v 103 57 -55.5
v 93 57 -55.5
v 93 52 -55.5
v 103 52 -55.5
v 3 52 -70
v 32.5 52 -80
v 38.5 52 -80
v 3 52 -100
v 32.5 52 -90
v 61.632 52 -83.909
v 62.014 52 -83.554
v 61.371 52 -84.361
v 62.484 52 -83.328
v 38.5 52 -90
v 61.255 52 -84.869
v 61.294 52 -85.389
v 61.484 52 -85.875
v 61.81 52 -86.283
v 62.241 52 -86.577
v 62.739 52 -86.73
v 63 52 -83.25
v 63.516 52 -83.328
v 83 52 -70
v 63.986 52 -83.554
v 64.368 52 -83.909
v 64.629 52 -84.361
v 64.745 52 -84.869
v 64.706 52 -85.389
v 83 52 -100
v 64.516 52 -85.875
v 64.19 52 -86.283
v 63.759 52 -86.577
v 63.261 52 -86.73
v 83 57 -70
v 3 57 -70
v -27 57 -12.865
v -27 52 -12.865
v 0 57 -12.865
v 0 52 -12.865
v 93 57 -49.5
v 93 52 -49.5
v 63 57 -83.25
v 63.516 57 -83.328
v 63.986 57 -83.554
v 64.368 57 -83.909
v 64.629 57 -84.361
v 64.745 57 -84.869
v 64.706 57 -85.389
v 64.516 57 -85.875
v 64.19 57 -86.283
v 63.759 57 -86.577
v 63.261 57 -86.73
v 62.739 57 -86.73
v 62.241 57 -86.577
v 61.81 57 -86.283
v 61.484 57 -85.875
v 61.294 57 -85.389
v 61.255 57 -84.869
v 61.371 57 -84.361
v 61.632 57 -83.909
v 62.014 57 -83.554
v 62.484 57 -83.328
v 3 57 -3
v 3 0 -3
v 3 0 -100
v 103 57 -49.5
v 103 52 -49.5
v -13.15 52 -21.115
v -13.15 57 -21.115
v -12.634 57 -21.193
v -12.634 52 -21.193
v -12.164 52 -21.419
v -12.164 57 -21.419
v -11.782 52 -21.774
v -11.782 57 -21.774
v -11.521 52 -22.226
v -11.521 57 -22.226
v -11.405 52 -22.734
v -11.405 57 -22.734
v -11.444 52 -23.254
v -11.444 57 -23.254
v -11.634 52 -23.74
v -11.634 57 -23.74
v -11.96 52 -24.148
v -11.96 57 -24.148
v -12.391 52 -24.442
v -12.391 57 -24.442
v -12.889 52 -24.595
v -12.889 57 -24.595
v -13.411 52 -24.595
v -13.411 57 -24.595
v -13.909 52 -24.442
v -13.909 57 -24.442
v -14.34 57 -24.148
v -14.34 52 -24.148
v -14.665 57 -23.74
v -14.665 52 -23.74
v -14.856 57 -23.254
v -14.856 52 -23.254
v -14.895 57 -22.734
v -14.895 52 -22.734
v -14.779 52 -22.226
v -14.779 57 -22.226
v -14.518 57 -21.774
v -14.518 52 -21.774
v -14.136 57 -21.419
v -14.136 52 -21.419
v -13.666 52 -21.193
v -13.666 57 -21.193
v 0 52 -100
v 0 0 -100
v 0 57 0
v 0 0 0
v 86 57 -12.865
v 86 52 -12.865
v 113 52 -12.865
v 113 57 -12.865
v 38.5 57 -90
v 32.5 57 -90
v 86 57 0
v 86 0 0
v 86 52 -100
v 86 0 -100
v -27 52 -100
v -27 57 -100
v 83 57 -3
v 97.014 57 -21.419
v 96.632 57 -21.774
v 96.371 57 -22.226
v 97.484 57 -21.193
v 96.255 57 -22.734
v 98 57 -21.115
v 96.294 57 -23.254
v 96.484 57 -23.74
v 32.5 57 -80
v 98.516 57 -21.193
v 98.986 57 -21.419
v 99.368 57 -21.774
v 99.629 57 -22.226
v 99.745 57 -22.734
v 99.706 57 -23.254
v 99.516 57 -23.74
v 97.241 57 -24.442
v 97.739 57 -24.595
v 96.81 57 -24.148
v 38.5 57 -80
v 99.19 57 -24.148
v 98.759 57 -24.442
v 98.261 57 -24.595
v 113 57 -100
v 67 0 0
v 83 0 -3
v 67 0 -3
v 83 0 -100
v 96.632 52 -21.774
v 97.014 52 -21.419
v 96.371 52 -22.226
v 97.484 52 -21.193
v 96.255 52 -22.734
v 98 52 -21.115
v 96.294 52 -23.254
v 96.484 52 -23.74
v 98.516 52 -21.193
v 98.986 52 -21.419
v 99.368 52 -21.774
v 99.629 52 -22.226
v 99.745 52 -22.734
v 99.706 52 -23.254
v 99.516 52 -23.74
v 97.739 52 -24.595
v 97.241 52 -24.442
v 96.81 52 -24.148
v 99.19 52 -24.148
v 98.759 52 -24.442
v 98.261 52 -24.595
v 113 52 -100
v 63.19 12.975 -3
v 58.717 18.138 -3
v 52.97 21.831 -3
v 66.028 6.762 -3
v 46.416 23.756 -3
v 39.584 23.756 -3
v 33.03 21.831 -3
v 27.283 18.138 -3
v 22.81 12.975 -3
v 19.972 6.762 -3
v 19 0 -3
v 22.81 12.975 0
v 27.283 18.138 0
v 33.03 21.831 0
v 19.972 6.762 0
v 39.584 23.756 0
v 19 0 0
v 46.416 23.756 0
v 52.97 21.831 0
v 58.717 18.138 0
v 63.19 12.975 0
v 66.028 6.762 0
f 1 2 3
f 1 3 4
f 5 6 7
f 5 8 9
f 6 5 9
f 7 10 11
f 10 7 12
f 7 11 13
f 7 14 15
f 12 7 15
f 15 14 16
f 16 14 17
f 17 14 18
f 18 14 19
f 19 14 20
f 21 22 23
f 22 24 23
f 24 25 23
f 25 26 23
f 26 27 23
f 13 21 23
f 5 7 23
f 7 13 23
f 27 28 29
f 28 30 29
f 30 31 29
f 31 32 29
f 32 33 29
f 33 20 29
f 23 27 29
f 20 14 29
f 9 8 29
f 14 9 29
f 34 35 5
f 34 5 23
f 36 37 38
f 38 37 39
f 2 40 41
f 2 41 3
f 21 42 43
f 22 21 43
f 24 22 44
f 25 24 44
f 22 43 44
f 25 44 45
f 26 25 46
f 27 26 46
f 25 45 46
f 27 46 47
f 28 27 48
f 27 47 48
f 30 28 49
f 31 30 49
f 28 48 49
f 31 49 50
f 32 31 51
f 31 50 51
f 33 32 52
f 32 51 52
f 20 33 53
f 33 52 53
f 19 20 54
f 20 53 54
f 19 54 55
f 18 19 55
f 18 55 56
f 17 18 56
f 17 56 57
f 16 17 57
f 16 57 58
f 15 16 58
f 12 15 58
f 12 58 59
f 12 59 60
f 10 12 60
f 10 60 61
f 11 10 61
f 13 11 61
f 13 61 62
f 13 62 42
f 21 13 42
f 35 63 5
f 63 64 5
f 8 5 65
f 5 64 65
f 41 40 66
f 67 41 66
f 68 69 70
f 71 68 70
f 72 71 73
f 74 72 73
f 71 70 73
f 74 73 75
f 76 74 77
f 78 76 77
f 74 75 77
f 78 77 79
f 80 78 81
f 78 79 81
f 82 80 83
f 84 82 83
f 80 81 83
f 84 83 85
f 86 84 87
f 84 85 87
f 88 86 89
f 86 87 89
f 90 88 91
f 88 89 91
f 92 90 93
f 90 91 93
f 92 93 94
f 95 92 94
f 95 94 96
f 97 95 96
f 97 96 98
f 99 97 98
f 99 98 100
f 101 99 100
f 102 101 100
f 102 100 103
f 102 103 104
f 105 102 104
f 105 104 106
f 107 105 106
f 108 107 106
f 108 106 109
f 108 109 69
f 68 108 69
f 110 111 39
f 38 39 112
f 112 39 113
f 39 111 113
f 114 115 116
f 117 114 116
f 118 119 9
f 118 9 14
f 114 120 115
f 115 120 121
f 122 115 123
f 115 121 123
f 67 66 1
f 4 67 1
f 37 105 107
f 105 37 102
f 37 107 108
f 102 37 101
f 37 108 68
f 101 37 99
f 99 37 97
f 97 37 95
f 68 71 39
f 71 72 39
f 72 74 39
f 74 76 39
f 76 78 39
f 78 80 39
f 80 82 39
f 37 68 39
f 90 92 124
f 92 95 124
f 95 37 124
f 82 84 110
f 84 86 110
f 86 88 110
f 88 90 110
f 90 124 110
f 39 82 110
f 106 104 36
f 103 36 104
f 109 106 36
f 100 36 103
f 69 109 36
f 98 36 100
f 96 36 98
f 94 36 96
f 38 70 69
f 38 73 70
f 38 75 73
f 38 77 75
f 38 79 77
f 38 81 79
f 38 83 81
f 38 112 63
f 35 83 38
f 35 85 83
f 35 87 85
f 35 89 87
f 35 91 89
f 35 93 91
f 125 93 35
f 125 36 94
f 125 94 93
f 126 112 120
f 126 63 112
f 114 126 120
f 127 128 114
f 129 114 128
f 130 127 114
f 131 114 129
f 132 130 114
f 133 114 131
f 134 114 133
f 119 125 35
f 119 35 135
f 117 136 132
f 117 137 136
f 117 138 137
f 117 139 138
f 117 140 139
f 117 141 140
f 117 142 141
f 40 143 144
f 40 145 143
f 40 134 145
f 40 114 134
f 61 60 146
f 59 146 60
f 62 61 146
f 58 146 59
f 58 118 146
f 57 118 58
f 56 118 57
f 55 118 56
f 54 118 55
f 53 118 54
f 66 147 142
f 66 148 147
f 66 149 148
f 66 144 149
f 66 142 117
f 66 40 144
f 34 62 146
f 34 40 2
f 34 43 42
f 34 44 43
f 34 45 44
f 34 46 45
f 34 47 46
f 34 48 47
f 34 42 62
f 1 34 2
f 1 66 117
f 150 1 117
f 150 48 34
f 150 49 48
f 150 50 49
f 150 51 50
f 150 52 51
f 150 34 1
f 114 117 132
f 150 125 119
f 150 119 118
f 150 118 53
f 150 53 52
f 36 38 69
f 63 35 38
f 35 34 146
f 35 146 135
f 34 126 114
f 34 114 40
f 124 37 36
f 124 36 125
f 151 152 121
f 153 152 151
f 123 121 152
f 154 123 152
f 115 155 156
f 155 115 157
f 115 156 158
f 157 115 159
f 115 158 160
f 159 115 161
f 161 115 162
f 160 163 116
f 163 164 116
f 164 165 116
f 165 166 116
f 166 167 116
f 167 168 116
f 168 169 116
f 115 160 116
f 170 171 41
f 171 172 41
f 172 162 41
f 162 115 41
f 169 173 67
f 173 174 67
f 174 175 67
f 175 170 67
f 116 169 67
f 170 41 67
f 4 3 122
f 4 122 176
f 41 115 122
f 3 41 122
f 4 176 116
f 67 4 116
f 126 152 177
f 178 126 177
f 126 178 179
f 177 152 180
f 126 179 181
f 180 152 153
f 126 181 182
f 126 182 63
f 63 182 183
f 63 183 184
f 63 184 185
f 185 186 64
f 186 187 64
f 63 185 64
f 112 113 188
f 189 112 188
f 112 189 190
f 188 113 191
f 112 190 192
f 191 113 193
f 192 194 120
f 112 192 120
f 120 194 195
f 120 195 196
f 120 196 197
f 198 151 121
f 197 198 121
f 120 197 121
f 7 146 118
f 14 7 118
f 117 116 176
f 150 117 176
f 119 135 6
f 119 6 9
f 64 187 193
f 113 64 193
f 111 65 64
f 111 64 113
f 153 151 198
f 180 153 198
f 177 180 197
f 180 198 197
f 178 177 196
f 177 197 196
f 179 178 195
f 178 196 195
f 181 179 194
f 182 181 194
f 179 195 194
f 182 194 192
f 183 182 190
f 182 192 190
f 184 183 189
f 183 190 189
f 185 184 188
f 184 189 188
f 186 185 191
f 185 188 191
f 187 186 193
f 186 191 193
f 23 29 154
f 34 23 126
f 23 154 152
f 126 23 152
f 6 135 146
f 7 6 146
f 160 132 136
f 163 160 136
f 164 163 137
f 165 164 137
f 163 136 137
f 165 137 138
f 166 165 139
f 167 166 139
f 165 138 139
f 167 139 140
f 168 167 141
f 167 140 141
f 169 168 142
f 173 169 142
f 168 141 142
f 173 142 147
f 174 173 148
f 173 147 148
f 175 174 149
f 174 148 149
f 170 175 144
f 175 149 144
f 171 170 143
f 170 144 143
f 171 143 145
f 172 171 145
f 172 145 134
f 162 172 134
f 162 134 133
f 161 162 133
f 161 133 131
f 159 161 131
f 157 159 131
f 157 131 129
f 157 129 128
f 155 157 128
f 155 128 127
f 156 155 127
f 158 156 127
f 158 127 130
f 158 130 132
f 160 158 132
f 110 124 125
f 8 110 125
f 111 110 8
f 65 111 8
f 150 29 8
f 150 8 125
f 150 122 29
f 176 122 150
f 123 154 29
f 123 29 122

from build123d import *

# Parameters (mm, degrees)
BOSS_EXTRUDE1_DEPTH = 52
SKETCH2_W           = 30
SKETCH2_H           = 87.134992814
BOSS_EXTRUDE2_DEPTH = 5
SKETCH3_W           = 80
SKETCH3_H           = 30
BOSS_EXTRUDE3_DEPTH = 5
BOSS_EXTRUDE4_DEPTH = 5
CUT_EXTRUDE2_DEPTH  = 5
SKETCH7_R           = 1.75
CUT_EXTRUDE3_DEPTH  = 162.300960939
SKETCH8_W           = 10
SKETCH8_H           = 6
SKETCH8_W_2         = 6
SKETCH8_H_2         = 10
CUT_EXTRUDE4_DEPTH  = 162.300960939


with BuildPart() as part:
    # Sketch1 → Boss-Extrude1 (new body)
    with BuildSketch(Plane(origin=(0, 0, 0), x_dir=(1, 0, 0), z_dir=(0, 1, 0))):
        Polygon((0, 0), (0, 100), (3, 100), (3, 3), (83, 3), (83, 100), (86, 100), (86, 0), align=None)
    extrude(amount=BOSS_EXTRUDE1_DEPTH)

    # Sketch2 → Boss-Extrude2 (add)
    with BuildSketch(Plane(origin=(0, 52, 0), x_dir=(1, 0, 0), z_dir=(0, 1, 0))):
        with Locations((98, 56.432503593)):
            Rectangle(SKETCH2_W, SKETCH2_H)
        with Locations((-12, 56.432503593)):
            Rectangle(SKETCH2_W, SKETCH2_H)
    extrude(amount=BOSS_EXTRUDE2_DEPTH)

    # Sketch3 → Boss-Extrude3 (add)
    with BuildSketch(Plane(origin=(0, 57, 0), x_dir=(1, 0, 0), z_dir=(0, 1, 0))):
        with Locations((43, 85)):
            Rectangle(SKETCH3_W, SKETCH3_H)
    extrude(amount=-BOSS_EXTRUDE3_DEPTH)

    # Sketch5 → Boss-Extrude4 (add)
    with BuildSketch(Plane(origin=(0, 52, 0), x_dir=(1, 0, 0), z_dir=(0, 1, 0))):
        Polygon((0, 12.865007186), (0, 0), (86, 0), (86, 12.865007186), (83, 12.865007186), (83, 3), (3, 3), (3, 12.865007186), align=None)
    extrude(amount=BOSS_EXTRUDE4_DEPTH)

    # Sketch6 → Cut-Extrude2 (cut)
    with BuildSketch(Plane.XY):
        with BuildLine():
            Line((19, 0), (67, 0))
            ThreePointArc((67, 0), (43, 24), (19, 0))
        make_face()
    extrude(amount=-CUT_EXTRUDE2_DEPTH, mode=Mode.SUBTRACT)

    # Sketch7 → Cut-Extrude3 (cut, through all)
    with BuildSketch(Plane(origin=(0, 57, 0), x_dir=(1, 0, 0), z_dir=(0, 1, 0))):
        with Locations(Location((-13.149809764, 22.865007186, 0), (0, 0, 270))):
            Circle(SKETCH7_R)
        with Locations(Location((63, 85, 0), (0, 0, 270))):
            Circle(SKETCH7_R)
        with Locations(Location((98, 22.865007186, 0), (0, 0, 270))):
            Circle(SKETCH7_R)
    extrude(amount=-CUT_EXTRUDE3_DEPTH, mode=Mode.SUBTRACT)

    # Sketch8 → Cut-Extrude4 (cut, through all)
    with BuildSketch(Plane(origin=(0, 57, 0), x_dir=(1, 0, 0), z_dir=(0, 1, 0))):
        with Locations((98, 52.5)):
            Rectangle(SKETCH8_W, SKETCH8_H)
        with Locations((35.5, 85)):
            Rectangle(SKETCH8_W_2, SKETCH8_H_2)
    extrude(amount=-CUT_EXTRUDE4_DEPTH, mode=Mode.SUBTRACT)


solid = part.part
